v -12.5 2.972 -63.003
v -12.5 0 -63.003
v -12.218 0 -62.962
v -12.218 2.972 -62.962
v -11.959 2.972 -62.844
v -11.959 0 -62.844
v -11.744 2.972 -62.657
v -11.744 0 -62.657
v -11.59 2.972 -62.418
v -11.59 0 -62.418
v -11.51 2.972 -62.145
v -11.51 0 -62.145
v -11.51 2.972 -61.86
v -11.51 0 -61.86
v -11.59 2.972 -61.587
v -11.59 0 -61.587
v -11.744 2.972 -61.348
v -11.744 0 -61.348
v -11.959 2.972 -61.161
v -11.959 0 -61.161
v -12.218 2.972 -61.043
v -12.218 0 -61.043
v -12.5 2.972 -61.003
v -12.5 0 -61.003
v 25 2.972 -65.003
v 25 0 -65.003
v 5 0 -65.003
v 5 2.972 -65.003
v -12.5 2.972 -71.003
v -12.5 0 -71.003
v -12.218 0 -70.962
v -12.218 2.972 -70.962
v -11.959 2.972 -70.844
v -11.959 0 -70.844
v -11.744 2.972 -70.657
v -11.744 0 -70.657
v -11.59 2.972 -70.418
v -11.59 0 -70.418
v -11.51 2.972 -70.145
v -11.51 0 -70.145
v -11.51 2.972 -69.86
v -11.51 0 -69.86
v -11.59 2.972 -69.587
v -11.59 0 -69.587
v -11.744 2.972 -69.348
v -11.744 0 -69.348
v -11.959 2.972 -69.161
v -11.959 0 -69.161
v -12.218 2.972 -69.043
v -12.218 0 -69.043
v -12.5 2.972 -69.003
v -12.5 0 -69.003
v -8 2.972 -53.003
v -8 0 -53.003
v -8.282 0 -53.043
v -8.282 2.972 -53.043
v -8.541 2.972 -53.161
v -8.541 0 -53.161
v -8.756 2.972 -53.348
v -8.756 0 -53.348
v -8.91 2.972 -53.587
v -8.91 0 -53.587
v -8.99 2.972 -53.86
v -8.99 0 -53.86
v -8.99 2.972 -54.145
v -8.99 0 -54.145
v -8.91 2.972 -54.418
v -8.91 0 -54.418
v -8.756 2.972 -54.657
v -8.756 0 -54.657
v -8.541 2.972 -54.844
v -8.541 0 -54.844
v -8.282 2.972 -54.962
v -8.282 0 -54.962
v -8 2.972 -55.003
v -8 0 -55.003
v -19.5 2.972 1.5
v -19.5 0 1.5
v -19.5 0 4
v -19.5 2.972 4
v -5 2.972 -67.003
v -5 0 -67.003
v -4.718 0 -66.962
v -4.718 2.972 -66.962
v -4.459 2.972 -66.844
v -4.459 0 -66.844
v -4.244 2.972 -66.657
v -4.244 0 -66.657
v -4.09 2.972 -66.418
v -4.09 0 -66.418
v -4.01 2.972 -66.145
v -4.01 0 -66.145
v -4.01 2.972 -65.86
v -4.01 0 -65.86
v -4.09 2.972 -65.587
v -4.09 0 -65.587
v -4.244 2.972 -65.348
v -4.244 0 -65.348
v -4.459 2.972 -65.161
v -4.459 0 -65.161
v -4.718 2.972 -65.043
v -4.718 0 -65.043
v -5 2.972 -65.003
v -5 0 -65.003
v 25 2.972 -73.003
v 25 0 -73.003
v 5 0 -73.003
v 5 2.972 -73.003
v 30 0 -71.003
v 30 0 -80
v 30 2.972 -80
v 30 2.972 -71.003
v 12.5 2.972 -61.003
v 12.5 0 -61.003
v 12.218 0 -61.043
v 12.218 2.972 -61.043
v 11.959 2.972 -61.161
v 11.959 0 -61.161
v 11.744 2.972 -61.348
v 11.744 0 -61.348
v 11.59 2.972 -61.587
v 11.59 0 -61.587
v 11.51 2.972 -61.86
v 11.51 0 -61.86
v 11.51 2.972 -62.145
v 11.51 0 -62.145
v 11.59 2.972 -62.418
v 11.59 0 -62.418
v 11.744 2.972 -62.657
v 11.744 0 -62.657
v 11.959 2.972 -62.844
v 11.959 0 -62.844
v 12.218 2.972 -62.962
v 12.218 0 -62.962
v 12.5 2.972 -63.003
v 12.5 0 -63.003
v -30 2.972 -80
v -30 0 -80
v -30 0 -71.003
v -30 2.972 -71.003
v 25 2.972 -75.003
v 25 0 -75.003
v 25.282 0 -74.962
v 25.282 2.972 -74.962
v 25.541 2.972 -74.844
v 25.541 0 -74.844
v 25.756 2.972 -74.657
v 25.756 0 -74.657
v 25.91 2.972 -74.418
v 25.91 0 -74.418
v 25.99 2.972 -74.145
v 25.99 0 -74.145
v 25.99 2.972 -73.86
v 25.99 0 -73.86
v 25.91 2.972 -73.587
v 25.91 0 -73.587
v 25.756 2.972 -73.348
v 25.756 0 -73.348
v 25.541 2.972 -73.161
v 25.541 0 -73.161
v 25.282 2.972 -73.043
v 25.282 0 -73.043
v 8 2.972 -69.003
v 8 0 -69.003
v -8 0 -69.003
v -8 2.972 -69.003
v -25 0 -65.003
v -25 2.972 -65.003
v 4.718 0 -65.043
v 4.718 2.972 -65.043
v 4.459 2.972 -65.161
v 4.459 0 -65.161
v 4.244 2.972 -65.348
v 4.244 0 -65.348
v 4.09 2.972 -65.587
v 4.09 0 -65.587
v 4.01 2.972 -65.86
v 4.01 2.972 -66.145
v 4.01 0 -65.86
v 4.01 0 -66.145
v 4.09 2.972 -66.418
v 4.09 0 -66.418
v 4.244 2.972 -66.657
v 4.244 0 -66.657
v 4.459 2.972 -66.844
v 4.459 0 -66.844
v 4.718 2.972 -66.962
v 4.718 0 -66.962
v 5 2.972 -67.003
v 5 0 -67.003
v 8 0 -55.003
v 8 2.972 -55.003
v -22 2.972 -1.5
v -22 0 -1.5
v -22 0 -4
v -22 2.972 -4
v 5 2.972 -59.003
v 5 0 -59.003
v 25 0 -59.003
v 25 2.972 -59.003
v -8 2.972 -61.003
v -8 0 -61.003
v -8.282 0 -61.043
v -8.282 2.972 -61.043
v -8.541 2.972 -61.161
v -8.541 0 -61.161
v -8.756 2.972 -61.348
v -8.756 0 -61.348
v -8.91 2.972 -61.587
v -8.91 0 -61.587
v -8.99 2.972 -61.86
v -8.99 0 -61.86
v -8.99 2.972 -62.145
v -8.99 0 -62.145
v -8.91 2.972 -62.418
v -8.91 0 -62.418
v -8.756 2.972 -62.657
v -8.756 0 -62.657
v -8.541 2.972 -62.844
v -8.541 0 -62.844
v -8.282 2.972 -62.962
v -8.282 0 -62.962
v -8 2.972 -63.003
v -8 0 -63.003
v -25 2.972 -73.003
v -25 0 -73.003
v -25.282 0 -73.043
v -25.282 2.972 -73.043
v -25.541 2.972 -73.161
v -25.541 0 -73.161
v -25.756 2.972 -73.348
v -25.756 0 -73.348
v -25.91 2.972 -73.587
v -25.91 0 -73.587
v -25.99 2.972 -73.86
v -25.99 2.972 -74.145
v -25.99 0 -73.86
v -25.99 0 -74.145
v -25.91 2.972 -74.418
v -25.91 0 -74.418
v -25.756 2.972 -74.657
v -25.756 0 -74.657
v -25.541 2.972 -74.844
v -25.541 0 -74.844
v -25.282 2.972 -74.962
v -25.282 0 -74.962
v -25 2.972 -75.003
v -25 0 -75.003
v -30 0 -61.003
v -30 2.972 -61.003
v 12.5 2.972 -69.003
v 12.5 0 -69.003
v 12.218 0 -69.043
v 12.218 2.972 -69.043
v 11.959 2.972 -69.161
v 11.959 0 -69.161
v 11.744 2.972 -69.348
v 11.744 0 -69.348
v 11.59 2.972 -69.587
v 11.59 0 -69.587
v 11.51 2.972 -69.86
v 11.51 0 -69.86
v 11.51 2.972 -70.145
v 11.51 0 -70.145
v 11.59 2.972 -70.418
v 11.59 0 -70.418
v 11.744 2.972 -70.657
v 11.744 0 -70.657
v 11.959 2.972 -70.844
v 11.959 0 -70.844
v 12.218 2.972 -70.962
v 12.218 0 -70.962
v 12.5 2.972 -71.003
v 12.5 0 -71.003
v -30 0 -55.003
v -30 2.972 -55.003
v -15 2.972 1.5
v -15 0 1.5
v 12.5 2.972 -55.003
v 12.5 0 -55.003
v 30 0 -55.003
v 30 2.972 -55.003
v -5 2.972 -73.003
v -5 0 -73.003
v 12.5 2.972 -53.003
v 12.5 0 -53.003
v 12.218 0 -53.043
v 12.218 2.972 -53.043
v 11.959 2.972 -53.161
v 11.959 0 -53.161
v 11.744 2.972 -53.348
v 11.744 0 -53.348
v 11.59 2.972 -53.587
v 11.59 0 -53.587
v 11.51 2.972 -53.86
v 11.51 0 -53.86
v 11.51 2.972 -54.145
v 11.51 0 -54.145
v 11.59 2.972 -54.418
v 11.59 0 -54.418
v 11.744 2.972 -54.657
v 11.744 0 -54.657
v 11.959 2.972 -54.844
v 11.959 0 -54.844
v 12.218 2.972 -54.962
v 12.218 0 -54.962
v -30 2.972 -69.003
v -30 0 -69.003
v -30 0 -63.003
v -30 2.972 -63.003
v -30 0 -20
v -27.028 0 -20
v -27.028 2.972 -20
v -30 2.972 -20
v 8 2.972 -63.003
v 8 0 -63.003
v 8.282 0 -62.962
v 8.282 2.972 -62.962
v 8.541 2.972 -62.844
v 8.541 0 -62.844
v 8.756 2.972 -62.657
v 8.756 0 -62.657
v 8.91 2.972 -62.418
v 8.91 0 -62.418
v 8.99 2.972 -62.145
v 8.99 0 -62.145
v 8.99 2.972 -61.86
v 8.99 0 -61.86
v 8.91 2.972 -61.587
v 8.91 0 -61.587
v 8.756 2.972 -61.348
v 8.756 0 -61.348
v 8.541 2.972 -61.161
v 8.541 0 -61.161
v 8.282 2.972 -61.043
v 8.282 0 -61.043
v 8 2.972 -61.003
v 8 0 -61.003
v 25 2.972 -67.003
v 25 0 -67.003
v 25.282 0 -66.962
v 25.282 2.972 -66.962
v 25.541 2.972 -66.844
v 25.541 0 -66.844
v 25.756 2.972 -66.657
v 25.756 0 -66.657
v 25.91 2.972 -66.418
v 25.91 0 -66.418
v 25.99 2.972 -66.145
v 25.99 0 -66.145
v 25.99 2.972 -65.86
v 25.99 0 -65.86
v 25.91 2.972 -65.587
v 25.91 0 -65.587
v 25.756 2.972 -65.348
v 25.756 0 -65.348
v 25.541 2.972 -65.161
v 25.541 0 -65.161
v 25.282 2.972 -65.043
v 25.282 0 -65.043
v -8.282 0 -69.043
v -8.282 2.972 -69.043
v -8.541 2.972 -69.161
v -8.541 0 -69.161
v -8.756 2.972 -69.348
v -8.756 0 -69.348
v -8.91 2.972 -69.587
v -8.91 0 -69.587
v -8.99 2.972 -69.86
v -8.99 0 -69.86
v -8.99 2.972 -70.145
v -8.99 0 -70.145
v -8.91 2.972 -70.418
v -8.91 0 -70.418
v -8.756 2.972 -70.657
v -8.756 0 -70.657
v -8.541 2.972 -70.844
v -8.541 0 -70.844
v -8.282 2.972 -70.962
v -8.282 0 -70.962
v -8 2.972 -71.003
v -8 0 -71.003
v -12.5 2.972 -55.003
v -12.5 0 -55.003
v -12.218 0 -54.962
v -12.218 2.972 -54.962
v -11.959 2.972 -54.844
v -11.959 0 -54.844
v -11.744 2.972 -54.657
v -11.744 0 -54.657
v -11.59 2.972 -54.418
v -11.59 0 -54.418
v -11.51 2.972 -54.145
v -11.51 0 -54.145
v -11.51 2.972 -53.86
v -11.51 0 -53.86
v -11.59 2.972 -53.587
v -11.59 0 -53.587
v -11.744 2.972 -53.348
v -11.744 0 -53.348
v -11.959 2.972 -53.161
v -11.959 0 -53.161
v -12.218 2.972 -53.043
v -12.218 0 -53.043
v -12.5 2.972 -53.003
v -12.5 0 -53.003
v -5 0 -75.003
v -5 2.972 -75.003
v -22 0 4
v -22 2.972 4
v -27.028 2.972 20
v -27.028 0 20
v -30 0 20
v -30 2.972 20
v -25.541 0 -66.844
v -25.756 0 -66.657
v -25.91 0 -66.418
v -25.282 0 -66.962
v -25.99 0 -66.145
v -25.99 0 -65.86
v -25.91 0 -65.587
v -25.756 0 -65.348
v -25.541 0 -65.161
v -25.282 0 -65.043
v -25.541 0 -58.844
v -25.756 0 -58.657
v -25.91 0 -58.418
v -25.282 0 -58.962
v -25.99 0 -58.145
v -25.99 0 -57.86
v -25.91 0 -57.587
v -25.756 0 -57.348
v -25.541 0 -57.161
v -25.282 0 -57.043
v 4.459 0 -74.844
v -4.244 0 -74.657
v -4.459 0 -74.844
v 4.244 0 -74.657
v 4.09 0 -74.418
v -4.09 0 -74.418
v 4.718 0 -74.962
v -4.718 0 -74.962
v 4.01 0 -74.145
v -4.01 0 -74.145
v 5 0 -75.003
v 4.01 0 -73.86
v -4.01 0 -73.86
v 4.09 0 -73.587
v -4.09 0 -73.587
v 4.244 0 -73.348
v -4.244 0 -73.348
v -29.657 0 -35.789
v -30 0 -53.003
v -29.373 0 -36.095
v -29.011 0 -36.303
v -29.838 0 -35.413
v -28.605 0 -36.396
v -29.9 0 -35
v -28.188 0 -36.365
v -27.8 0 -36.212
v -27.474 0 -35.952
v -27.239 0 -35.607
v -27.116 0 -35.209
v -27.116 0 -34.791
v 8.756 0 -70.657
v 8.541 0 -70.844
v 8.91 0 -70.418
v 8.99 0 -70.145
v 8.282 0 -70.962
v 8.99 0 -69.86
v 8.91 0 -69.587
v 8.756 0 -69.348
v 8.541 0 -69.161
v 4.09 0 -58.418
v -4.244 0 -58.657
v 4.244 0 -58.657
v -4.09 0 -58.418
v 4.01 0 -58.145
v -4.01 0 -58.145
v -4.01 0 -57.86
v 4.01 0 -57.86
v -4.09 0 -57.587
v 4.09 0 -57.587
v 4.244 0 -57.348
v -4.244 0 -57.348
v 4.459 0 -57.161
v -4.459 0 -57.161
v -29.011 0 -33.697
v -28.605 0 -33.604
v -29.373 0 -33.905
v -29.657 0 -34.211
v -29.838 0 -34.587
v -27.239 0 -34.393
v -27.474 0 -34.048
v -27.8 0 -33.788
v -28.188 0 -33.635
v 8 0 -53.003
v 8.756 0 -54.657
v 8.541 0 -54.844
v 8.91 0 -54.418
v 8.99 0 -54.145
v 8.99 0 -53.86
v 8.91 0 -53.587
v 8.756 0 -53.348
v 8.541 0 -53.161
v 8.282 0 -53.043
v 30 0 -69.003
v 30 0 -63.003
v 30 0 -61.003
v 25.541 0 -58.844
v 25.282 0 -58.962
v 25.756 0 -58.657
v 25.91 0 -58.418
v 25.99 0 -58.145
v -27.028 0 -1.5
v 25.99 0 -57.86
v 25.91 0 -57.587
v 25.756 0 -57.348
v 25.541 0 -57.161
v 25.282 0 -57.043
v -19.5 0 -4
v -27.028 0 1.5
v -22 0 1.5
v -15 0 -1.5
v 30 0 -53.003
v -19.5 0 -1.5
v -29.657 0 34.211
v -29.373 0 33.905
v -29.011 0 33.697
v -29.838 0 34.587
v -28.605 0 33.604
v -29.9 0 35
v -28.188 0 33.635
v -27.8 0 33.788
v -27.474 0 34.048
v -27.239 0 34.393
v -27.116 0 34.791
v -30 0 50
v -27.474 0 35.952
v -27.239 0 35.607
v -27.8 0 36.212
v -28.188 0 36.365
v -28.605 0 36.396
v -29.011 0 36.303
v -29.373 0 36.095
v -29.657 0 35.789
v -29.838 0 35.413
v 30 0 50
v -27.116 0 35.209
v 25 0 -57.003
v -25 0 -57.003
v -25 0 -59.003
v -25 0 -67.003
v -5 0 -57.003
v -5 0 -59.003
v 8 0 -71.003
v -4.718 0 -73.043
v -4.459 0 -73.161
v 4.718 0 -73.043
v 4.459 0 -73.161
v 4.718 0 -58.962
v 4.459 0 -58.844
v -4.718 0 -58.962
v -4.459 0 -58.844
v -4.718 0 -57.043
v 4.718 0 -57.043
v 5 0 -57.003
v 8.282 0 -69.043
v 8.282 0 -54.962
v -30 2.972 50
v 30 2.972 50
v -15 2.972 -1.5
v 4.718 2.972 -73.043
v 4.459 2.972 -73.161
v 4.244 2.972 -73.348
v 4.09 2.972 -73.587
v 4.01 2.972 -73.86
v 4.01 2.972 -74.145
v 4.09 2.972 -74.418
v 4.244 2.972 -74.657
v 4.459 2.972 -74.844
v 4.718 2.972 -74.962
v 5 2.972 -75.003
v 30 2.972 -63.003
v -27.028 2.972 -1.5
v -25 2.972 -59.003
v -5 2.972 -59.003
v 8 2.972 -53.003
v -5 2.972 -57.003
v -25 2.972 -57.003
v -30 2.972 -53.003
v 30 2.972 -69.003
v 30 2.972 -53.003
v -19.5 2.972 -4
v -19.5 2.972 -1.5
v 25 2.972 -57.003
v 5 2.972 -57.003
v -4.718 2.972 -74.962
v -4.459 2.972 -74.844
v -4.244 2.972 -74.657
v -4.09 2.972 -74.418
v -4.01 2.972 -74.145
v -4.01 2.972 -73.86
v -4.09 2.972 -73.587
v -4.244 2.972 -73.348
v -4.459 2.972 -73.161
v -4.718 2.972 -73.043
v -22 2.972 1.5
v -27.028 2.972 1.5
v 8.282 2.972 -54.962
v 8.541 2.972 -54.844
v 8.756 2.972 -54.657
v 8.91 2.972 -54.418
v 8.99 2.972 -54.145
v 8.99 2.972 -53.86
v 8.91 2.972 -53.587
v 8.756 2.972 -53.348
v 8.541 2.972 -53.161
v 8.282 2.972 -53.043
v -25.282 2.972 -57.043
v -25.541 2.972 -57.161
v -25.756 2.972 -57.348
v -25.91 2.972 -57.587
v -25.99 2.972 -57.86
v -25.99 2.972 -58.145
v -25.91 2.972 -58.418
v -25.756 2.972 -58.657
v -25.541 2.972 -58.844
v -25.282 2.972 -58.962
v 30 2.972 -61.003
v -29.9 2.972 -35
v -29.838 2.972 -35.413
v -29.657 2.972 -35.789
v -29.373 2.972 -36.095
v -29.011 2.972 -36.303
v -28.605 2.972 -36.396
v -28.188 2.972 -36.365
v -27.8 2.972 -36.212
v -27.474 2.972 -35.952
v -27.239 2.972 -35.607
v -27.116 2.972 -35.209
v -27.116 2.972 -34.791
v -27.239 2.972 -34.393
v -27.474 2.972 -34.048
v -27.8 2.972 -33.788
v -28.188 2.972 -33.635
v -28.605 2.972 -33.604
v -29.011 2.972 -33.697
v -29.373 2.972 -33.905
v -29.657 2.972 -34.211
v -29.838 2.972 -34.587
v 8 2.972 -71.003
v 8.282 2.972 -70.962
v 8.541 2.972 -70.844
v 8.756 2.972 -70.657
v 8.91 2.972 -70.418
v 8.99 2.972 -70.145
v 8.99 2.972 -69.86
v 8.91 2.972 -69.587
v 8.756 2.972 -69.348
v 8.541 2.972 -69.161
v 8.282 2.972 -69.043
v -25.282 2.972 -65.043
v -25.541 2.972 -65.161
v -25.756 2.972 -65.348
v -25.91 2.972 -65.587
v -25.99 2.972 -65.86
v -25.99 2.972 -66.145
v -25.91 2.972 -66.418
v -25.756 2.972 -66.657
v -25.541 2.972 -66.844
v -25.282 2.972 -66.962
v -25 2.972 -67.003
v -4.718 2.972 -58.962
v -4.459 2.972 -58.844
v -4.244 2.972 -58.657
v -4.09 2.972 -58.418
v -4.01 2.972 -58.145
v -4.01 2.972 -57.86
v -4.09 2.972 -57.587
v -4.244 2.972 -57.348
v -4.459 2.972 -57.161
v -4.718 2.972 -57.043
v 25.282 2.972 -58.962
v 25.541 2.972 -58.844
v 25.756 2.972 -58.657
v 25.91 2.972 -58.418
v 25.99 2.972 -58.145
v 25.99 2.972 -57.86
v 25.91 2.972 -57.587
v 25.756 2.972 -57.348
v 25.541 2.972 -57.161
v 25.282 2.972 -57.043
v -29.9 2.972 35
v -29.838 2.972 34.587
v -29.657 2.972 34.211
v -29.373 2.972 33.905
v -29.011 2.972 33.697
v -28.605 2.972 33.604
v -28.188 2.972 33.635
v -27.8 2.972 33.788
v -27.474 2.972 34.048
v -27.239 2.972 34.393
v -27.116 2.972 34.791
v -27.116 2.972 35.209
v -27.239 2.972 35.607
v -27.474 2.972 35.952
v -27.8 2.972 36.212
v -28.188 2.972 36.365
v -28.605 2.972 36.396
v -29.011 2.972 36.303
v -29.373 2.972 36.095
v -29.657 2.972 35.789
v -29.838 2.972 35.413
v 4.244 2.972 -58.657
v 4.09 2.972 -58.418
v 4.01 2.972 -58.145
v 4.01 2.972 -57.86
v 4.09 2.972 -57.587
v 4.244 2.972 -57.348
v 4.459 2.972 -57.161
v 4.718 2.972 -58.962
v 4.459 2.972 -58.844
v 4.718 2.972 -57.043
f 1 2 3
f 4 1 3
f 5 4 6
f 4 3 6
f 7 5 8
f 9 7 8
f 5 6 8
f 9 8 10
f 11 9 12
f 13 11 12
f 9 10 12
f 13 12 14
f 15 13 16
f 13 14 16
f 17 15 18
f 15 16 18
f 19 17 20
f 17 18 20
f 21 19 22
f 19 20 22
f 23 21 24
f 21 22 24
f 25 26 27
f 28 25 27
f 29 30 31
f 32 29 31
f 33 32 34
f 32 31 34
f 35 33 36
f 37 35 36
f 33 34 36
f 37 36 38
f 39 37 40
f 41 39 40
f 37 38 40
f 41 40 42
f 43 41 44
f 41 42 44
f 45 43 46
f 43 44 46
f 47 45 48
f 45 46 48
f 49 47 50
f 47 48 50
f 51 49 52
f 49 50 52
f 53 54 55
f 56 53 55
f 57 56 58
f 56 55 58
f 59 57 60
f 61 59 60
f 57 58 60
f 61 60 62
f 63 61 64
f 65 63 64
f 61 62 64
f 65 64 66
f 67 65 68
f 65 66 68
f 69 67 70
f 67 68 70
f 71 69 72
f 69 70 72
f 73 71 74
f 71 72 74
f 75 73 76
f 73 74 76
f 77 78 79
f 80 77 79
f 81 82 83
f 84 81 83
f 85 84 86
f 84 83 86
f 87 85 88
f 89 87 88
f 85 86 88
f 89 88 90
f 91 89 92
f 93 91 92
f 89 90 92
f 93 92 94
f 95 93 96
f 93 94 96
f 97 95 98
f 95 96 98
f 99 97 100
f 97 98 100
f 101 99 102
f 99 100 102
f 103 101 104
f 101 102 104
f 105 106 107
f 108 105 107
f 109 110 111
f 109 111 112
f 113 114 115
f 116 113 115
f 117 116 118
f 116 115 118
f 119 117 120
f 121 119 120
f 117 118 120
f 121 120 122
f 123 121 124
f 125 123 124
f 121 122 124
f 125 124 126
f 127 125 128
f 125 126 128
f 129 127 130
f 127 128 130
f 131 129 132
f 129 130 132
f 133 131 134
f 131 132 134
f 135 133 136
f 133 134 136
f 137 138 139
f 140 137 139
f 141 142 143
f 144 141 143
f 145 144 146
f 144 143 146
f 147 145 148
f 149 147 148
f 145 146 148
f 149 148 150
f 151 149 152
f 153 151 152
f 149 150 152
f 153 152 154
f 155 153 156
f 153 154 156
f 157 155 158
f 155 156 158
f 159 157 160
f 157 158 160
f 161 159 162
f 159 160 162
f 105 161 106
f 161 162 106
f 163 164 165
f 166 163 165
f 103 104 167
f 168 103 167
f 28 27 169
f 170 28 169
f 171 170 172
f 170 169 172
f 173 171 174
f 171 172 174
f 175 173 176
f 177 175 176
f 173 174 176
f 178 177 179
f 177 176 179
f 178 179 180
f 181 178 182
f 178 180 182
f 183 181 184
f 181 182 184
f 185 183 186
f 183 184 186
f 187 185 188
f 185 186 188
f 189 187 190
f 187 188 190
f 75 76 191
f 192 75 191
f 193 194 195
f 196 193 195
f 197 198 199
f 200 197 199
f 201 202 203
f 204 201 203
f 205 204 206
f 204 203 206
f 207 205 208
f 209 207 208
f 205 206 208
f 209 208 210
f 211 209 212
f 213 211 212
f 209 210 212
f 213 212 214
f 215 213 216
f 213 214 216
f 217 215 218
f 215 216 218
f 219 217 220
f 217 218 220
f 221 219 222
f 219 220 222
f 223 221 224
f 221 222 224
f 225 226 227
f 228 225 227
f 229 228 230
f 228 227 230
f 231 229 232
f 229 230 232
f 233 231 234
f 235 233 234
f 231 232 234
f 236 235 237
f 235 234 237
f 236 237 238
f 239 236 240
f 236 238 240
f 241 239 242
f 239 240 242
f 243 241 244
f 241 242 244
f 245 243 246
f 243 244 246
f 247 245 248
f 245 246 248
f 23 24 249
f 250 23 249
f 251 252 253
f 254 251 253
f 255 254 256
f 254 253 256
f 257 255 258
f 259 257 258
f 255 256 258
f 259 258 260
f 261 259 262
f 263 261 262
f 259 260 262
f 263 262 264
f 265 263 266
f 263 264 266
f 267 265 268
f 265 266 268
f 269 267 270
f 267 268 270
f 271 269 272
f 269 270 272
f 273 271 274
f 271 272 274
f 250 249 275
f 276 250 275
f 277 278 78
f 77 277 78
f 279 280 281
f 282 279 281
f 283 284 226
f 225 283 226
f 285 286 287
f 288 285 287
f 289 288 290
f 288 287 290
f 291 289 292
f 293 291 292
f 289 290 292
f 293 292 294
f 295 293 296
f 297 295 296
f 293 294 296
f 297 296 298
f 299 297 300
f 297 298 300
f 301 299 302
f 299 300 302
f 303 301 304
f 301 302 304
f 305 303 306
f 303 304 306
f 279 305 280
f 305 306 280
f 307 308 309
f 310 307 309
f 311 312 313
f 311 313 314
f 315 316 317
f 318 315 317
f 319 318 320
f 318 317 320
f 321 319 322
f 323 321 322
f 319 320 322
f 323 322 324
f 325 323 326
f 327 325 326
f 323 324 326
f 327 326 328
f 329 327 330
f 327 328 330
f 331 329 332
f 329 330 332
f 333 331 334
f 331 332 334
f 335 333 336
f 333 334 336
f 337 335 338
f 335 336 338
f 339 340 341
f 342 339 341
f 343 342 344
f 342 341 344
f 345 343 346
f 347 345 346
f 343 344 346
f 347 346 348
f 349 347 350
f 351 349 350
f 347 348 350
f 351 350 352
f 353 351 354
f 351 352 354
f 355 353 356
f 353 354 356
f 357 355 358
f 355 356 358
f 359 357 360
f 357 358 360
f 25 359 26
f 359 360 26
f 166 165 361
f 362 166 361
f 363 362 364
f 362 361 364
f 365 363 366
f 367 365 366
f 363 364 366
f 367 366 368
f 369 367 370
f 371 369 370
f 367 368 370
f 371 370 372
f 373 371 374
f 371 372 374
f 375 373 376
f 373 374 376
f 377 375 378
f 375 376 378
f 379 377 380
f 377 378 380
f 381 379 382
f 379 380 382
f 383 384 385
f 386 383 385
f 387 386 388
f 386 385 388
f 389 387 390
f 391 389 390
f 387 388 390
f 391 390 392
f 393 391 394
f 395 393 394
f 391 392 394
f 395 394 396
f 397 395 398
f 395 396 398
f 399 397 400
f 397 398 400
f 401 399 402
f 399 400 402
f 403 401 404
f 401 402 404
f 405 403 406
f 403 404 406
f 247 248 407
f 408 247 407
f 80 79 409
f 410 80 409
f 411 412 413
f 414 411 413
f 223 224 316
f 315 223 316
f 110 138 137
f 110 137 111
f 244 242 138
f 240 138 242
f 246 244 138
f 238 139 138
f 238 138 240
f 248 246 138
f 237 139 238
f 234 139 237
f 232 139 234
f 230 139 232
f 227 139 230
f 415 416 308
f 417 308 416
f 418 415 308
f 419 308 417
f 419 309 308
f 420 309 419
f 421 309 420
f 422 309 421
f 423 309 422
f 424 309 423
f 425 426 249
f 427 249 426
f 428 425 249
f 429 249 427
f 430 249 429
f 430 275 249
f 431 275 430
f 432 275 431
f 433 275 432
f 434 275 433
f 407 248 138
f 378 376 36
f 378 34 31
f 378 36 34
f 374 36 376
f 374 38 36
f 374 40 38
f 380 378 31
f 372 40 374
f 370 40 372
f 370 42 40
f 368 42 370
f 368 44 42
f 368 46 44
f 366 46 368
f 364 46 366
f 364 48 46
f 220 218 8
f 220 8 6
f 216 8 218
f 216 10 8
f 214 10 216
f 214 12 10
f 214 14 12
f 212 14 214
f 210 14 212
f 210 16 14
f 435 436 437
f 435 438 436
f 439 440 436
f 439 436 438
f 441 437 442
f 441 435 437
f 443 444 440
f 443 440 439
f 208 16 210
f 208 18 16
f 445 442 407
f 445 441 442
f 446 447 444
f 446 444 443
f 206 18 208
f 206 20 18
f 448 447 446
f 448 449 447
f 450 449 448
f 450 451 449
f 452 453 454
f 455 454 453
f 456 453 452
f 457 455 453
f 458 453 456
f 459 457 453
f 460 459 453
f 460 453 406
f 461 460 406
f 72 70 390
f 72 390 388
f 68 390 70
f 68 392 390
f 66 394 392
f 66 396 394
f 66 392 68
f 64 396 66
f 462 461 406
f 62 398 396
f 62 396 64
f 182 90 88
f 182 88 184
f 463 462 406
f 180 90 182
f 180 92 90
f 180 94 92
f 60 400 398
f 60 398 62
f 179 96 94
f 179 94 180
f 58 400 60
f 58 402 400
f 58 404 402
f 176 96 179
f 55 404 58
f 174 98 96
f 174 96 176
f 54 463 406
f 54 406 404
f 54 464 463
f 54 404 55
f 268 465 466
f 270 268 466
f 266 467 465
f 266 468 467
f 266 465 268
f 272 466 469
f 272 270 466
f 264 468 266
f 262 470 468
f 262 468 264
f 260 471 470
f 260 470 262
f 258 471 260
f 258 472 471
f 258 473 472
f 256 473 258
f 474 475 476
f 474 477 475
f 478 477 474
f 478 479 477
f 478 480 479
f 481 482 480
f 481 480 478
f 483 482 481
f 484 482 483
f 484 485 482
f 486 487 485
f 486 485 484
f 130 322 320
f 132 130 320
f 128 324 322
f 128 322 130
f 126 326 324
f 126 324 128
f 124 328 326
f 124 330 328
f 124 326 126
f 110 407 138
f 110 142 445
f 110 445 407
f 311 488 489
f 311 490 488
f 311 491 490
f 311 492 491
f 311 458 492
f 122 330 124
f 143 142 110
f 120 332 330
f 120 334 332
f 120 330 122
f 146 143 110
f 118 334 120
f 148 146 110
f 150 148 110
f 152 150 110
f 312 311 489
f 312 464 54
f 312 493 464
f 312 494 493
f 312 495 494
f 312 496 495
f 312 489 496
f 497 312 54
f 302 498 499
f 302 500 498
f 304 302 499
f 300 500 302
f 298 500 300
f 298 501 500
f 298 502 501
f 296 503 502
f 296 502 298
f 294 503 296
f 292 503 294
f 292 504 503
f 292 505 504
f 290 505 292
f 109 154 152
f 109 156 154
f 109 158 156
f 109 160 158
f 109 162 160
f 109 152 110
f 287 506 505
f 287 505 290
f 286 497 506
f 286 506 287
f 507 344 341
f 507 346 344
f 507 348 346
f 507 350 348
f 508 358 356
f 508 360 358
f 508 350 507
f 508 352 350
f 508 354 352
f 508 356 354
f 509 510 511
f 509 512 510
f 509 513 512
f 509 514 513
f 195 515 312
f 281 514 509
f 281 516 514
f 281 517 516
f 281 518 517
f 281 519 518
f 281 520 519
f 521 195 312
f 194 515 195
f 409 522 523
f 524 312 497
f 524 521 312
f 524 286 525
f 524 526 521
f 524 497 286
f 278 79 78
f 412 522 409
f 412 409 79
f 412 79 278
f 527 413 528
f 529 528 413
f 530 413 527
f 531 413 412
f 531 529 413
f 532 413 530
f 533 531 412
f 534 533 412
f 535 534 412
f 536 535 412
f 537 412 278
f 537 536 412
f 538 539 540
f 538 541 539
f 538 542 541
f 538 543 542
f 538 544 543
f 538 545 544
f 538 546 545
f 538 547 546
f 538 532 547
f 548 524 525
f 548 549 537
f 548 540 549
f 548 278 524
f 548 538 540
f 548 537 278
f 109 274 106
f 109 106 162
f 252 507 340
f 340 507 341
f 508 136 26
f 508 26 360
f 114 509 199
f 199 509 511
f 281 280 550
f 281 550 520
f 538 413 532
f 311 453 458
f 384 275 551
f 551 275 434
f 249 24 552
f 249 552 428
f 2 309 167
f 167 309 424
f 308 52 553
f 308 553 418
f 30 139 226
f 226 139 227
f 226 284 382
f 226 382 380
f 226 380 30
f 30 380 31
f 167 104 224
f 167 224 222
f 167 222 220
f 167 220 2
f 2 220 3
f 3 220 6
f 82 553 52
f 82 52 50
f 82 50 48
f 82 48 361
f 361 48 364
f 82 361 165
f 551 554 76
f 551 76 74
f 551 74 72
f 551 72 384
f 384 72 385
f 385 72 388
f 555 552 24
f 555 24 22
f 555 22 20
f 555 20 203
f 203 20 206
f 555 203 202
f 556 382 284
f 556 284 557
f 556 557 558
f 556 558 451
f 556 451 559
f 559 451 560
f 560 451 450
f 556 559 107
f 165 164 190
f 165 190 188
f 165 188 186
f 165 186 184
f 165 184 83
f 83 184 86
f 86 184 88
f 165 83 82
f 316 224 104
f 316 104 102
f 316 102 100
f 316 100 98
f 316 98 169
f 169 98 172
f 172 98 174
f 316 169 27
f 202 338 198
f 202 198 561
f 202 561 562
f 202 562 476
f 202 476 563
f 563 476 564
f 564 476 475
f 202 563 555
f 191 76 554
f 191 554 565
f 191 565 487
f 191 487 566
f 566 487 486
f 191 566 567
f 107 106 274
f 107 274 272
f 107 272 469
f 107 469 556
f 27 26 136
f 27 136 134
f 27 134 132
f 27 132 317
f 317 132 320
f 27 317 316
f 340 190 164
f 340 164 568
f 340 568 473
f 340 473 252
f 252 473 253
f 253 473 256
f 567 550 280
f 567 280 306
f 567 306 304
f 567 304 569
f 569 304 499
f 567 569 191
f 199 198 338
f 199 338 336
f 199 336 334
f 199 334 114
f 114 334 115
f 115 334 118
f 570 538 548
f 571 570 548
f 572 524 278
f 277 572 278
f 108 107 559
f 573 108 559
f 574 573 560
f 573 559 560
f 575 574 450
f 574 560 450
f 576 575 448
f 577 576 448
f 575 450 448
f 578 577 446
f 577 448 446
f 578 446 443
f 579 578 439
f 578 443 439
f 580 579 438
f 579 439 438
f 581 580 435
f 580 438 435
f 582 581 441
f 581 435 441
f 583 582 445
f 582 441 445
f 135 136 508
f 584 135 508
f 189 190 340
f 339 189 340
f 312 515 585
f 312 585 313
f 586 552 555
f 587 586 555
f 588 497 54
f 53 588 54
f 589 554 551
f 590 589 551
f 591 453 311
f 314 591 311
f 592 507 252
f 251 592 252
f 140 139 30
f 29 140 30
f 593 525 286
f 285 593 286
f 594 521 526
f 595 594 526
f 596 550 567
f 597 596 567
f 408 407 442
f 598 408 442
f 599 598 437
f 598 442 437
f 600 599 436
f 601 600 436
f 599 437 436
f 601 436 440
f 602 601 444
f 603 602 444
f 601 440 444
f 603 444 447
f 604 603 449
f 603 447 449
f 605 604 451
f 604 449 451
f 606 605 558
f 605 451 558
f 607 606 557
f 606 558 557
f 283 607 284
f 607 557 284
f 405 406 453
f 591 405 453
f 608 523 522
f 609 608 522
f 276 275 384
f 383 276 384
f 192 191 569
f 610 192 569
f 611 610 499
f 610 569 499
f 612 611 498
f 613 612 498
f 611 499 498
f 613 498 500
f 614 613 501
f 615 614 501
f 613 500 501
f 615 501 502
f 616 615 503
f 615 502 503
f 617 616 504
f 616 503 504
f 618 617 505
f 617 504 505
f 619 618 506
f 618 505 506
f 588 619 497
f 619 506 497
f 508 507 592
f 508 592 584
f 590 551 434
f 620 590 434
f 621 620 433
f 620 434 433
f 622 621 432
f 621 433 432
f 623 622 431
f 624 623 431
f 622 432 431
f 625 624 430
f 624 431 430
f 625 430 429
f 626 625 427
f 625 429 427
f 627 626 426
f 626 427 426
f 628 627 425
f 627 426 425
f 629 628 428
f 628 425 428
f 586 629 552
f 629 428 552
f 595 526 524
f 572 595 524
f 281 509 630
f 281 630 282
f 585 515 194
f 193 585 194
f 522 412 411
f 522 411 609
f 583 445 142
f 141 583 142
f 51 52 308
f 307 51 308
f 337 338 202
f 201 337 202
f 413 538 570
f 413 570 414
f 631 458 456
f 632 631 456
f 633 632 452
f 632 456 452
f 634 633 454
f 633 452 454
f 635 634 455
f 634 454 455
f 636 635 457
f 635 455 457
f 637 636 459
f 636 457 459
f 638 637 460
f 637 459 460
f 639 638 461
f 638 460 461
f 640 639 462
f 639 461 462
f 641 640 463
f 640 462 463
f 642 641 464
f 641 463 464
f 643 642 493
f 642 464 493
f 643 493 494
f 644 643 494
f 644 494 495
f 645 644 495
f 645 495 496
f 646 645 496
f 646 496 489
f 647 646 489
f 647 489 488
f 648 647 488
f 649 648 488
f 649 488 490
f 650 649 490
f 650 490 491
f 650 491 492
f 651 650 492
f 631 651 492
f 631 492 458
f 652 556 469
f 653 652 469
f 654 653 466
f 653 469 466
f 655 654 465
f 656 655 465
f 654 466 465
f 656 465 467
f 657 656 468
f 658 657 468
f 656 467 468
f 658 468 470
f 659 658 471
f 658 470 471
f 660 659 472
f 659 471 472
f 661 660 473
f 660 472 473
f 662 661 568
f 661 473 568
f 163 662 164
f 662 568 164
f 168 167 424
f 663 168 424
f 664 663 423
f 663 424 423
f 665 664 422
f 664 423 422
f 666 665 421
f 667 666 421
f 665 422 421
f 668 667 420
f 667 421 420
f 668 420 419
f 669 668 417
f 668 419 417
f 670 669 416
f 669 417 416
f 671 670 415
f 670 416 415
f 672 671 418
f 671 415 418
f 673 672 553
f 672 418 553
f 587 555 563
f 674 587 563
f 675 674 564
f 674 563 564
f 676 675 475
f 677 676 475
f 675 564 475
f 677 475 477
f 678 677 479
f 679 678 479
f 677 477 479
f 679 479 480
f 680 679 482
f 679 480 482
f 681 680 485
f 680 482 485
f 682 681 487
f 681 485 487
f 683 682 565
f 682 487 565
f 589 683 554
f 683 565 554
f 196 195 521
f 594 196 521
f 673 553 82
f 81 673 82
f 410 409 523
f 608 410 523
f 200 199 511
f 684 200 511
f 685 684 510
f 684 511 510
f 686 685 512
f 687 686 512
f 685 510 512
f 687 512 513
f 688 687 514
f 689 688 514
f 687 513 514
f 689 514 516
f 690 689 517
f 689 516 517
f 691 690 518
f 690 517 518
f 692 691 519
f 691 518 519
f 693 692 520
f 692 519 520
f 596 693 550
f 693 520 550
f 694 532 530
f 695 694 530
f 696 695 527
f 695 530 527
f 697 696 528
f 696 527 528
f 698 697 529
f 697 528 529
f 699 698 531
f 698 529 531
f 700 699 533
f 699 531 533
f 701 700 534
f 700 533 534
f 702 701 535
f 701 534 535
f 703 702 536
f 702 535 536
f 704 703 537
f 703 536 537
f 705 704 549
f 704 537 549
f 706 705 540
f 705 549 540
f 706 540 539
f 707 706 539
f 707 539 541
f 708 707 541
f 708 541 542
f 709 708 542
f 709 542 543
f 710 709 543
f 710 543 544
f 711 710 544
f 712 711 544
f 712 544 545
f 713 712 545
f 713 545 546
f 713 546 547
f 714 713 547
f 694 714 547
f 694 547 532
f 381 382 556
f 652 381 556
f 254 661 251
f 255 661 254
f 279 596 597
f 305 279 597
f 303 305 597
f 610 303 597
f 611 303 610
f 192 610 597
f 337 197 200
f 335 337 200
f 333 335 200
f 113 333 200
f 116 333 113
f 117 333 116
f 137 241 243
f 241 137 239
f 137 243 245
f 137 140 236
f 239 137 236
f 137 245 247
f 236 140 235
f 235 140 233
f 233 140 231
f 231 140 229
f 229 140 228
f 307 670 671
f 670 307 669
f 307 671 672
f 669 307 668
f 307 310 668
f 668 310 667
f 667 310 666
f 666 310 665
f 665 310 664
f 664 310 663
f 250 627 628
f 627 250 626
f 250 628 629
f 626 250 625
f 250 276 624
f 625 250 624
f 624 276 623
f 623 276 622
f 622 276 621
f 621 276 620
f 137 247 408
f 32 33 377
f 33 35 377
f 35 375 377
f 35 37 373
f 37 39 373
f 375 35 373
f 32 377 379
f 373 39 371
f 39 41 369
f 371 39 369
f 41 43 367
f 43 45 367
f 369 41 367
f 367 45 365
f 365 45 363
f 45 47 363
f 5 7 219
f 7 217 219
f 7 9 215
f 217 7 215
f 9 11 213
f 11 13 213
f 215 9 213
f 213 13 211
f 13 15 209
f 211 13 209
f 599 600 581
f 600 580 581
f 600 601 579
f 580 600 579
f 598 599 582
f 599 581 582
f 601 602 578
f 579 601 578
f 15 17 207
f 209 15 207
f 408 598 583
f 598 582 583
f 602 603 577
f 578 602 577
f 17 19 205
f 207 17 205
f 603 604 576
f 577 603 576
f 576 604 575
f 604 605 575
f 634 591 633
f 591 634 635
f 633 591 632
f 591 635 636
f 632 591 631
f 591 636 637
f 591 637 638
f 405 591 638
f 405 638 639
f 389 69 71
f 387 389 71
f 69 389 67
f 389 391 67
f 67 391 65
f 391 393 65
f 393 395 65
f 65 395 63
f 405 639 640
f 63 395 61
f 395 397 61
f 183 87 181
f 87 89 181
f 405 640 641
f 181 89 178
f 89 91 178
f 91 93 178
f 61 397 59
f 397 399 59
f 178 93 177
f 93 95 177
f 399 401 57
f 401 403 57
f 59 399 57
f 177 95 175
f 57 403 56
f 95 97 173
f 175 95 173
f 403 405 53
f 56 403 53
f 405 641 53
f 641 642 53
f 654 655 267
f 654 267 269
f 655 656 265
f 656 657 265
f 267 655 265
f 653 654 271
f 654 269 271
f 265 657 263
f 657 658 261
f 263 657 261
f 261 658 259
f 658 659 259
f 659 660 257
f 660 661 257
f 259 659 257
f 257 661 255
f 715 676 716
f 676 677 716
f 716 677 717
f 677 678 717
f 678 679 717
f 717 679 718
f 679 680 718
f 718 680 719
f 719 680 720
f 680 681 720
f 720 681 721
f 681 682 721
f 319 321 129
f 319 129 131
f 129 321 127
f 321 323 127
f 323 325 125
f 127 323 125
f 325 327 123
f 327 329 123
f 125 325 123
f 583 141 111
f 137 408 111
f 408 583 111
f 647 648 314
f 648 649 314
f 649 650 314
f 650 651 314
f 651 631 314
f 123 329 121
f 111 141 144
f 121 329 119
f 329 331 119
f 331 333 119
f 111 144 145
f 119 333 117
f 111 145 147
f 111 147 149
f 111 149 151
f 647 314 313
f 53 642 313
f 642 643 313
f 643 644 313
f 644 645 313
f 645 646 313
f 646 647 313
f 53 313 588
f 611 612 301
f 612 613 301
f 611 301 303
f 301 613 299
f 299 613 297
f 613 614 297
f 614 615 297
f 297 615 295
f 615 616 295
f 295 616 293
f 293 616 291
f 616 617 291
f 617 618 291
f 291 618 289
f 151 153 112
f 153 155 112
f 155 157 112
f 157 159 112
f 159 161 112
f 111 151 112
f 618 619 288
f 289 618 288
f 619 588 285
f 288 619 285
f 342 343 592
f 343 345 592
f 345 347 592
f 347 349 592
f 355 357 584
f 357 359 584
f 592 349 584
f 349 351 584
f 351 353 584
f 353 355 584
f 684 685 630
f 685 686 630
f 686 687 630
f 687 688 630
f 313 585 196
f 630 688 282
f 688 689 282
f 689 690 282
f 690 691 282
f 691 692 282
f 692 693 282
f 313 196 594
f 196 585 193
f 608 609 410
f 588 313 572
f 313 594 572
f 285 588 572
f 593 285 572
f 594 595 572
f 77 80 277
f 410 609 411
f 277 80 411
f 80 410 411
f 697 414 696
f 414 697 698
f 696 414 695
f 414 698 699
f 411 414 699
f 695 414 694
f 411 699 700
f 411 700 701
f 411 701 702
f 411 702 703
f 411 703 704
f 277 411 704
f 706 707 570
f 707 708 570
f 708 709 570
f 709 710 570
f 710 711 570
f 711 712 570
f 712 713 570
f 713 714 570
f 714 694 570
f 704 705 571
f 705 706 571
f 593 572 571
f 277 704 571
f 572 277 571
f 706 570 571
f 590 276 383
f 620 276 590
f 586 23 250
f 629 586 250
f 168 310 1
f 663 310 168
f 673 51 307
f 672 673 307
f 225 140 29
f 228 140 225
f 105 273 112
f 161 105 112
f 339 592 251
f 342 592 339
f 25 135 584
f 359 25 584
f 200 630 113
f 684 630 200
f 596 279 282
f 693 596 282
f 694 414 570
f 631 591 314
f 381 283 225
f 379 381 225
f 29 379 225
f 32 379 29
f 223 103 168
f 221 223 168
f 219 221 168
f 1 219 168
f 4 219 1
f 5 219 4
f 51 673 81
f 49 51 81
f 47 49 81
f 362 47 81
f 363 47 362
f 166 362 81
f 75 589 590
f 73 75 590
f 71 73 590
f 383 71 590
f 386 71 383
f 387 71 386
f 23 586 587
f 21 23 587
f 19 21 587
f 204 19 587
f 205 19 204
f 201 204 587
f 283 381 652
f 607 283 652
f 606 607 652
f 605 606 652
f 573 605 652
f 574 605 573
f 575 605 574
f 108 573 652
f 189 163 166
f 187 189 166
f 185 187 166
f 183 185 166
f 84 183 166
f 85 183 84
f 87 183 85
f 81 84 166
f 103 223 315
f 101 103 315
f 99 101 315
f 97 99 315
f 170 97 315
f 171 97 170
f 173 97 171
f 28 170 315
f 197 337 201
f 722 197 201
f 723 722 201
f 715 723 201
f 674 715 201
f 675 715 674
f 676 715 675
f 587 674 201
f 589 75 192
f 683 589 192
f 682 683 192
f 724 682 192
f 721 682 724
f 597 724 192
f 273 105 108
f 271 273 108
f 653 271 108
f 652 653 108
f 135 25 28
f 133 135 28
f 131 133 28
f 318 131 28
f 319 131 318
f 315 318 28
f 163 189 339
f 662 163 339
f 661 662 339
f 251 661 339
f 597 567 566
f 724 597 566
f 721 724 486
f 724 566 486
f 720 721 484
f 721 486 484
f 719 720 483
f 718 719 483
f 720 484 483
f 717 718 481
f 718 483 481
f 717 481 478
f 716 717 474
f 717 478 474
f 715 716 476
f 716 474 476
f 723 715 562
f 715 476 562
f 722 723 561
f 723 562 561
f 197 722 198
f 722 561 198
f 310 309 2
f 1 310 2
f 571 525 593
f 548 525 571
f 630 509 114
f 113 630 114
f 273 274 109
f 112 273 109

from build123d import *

# Parameters (mm, degrees)
SKETCH_1_W                  = 60
SKETCH_1_H                  = 100
EXTRUDE_1_DEPTH             = 2.9718
SKETCH_2_W                  = 2.9718
SKETCH_2_H                  = 40
CUT_EXTRUDE_1_DEPTH         = 10
SKETCH_4_W                  = 60
SKETCH_4_H                  = 30
EXTRUDE_2_DEPTH             = 2.9718
CUT_EXTRUDE_2_DEPTH         = 2.9718
PATTERN_LINEAR_1_COUNT      = 3
PATTERN_LINEAR_1_PITCH      = 8
SKETCH_5_R                  = 1
CUT_EXTRUDE_3_DEPTH         = 10
PATTERN_LINEAR_2_COUNT      = 3
PATTERN_LINEAR_2_PITCH      = 8
PATTERN_LINEAR_2_COUNT_DIR2 = 2
PATTERN_LINEAR_2_PITCH_DIR2 = 30
CUT_EXTRUDE_4_DEPTH         = 10
SKETCH_8_R                  = 1.4
CUT_EXTRUDE_5_DEPTH         = 10
PATTERN_LINEAR_3_COUNT      = 4
PATTERN_LINEAR_3_PITCH      = 70


with BuildPart() as part:
    # 草图1 → 凸台-拉伸1 (new body)
    with BuildSketch(Plane(origin=(0, 0, 0), x_dir=(1, 0, 0), z_dir=(0, 1, 0))):
        Rectangle(SKETCH_1_W, SKETCH_1_H)
    extrude(amount=EXTRUDE_1_DEPTH)

    # 草图2 → 切除-拉伸1 (cut)
    with BuildSketch(Plane(origin=(0, 0, 0), x_dir=(-1, 0, 0), z_dir=(0, -1, 0))):
        with Locations((28.5141, 0)):
            Rectangle(SKETCH_2_W, SKETCH_2_H)
    extrude(amount=-CUT_EXTRUDE_1_DEPTH, mode=Mode.SUBTRACT)

    # 草图4 → 凸台-拉伸2 (add)
    with BuildSketch(Plane.XZ):
        with Locations((0, -65)):
            Rectangle(SKETCH_4_W, SKETCH_4_H)
    extrude(amount=-EXTRUDE_2_DEPTH)

    # 草图3 → 切除-拉伸2 (cut)
    with BuildSketch(Plane(origin=(0, 0, 0), x_dir=(-1, 0, 0), z_dir=(0, -1, 0))):
        with BuildLine():
            Line((-12.5, 55.002516758), (-30, 55.002516758))
            Line((-30, 55.002516758), (-30, 53.002516758))
            Line((-30, 53.002516758), (-12.5, 53.002516758))
            ThreePointArc((-12.5, 53.002516758), (-11.5, 54.002516758), (-12.5, 55.002516758))
        make_face()
        with BuildLine():
            Line((30, 53.002516758), (30, 55.002516758))
            Line((30, 55.002516758), (12.5, 55.002516758))
            ThreePointArc((12.5, 55.002516758), (11.5, 54.002516758), (12.5, 53.002516758))
            Line((12.5, 53.002516758), (30, 53.002516758))
        make_face()
        with BuildLine():
            Line((8, 55.002516758), (-8, 55.002516758))
            ThreePointArc((-8, 55.002516758), (-9, 54.002516758), (-8, 53.002516758))
            Line((-8, 53.002516758), (8, 53.002516758))
            ThreePointArc((8, 53.002516758), (9, 54.002516758), (8, 55.002516758))
        make_face()
    cut_extrude_2 = extrude(amount=-CUT_EXTRUDE_2_DEPTH, mode=Mode.SUBTRACT)

    # 阵列(线性)1: 切除-拉伸2 ×3
    with Locations(*[(0, 0, -i * PATTERN_LINEAR_1_PITCH) for i in range(1, PATTERN_LINEAR_1_COUNT)]):
        add(cut_extrude_2, mode=Mode.SUBTRACT)

    # 草图5 → 切除-拉伸3 (cut)
    with BuildSketch(Plane.XZ):
        with BuildLine():
            Line((-5, -57.002516758), (-25, -57.002516758))
            ThreePointArc((-25, -57.002516758), (-24.292893219, -57.295409977), (-24, -58.002516758))
            ThreePointArc((-24, -58.002516758), (-24.292893219, -58.709623539), (-25, -59.002516758))
            Line((-25, -59.002516758), (-5, -59.002516758))
            ThreePointArc((-5, -59.002516758), (-6, -58.002516758), (-5, -57.002516758))
        make_face()
        with Locations((-25, -58.002516758)):
            Circle(SKETCH_5_R)
        with Locations((-5, -58.002516758)):
            Circle(SKETCH_5_R)
    cut_extrude_3 = extrude(amount=-CUT_EXTRUDE_3_DEPTH, mode=Mode.SUBTRACT)

    # 阵列(线性)2: Cut-Extrude 3 3 × 2
    with Locations(*[(j * PATTERN_LINEAR_2_PITCH_DIR2, 0, -i * PATTERN_LINEAR_2_PITCH) for i in range(PATTERN_LINEAR_2_COUNT) for j in range(PATTERN_LINEAR_2_COUNT_DIR2) if (i, j) != (0, 0)]):
        add(cut_extrude_3, mode=Mode.SUBTRACT)

    # 草图7 → 切除-拉伸4 (cut)
    with BuildSketch(Plane.XZ):
        Polygon((-30, 1.5), (-30, 0), (-15, 0), (-15, 1.5), (-19.5, 1.5), (-19.5, 4), (-22, 4), (-22, 1.5), align=None)
        Polygon((-30, 0), (-30, -1.5), (-22, -1.5), (-22, -4), (-19.5, -4), (-19.5, -1.5), (-15, -1.5), (-15, 0), align=None)
    extrude(amount=-CUT_EXTRUDE_4_DEPTH, mode=Mode.SUBTRACT)

    # 草图8 → 切除-拉伸5 (cut)
    with BuildSketch(Plane(origin=(0, 0, 0), x_dir=(-1, 0, 0), z_dir=(0, -1, 0))):
        with Locations((28.5, -35)):
            Circle(SKETCH_8_R)
    cut_extrude_5 = extrude(amount=-CUT_EXTRUDE_5_DEPTH, mode=Mode.SUBTRACT)

    # 阵列(线性)3: 切除-拉伸5 ×4
    with Locations(*[(0, 0, -i * PATTERN_LINEAR_3_PITCH) for i in range(1, PATTERN_LINEAR_3_COUNT)]):
        add(cut_extrude_5, mode=Mode.SUBTRACT)


solid = part.part
